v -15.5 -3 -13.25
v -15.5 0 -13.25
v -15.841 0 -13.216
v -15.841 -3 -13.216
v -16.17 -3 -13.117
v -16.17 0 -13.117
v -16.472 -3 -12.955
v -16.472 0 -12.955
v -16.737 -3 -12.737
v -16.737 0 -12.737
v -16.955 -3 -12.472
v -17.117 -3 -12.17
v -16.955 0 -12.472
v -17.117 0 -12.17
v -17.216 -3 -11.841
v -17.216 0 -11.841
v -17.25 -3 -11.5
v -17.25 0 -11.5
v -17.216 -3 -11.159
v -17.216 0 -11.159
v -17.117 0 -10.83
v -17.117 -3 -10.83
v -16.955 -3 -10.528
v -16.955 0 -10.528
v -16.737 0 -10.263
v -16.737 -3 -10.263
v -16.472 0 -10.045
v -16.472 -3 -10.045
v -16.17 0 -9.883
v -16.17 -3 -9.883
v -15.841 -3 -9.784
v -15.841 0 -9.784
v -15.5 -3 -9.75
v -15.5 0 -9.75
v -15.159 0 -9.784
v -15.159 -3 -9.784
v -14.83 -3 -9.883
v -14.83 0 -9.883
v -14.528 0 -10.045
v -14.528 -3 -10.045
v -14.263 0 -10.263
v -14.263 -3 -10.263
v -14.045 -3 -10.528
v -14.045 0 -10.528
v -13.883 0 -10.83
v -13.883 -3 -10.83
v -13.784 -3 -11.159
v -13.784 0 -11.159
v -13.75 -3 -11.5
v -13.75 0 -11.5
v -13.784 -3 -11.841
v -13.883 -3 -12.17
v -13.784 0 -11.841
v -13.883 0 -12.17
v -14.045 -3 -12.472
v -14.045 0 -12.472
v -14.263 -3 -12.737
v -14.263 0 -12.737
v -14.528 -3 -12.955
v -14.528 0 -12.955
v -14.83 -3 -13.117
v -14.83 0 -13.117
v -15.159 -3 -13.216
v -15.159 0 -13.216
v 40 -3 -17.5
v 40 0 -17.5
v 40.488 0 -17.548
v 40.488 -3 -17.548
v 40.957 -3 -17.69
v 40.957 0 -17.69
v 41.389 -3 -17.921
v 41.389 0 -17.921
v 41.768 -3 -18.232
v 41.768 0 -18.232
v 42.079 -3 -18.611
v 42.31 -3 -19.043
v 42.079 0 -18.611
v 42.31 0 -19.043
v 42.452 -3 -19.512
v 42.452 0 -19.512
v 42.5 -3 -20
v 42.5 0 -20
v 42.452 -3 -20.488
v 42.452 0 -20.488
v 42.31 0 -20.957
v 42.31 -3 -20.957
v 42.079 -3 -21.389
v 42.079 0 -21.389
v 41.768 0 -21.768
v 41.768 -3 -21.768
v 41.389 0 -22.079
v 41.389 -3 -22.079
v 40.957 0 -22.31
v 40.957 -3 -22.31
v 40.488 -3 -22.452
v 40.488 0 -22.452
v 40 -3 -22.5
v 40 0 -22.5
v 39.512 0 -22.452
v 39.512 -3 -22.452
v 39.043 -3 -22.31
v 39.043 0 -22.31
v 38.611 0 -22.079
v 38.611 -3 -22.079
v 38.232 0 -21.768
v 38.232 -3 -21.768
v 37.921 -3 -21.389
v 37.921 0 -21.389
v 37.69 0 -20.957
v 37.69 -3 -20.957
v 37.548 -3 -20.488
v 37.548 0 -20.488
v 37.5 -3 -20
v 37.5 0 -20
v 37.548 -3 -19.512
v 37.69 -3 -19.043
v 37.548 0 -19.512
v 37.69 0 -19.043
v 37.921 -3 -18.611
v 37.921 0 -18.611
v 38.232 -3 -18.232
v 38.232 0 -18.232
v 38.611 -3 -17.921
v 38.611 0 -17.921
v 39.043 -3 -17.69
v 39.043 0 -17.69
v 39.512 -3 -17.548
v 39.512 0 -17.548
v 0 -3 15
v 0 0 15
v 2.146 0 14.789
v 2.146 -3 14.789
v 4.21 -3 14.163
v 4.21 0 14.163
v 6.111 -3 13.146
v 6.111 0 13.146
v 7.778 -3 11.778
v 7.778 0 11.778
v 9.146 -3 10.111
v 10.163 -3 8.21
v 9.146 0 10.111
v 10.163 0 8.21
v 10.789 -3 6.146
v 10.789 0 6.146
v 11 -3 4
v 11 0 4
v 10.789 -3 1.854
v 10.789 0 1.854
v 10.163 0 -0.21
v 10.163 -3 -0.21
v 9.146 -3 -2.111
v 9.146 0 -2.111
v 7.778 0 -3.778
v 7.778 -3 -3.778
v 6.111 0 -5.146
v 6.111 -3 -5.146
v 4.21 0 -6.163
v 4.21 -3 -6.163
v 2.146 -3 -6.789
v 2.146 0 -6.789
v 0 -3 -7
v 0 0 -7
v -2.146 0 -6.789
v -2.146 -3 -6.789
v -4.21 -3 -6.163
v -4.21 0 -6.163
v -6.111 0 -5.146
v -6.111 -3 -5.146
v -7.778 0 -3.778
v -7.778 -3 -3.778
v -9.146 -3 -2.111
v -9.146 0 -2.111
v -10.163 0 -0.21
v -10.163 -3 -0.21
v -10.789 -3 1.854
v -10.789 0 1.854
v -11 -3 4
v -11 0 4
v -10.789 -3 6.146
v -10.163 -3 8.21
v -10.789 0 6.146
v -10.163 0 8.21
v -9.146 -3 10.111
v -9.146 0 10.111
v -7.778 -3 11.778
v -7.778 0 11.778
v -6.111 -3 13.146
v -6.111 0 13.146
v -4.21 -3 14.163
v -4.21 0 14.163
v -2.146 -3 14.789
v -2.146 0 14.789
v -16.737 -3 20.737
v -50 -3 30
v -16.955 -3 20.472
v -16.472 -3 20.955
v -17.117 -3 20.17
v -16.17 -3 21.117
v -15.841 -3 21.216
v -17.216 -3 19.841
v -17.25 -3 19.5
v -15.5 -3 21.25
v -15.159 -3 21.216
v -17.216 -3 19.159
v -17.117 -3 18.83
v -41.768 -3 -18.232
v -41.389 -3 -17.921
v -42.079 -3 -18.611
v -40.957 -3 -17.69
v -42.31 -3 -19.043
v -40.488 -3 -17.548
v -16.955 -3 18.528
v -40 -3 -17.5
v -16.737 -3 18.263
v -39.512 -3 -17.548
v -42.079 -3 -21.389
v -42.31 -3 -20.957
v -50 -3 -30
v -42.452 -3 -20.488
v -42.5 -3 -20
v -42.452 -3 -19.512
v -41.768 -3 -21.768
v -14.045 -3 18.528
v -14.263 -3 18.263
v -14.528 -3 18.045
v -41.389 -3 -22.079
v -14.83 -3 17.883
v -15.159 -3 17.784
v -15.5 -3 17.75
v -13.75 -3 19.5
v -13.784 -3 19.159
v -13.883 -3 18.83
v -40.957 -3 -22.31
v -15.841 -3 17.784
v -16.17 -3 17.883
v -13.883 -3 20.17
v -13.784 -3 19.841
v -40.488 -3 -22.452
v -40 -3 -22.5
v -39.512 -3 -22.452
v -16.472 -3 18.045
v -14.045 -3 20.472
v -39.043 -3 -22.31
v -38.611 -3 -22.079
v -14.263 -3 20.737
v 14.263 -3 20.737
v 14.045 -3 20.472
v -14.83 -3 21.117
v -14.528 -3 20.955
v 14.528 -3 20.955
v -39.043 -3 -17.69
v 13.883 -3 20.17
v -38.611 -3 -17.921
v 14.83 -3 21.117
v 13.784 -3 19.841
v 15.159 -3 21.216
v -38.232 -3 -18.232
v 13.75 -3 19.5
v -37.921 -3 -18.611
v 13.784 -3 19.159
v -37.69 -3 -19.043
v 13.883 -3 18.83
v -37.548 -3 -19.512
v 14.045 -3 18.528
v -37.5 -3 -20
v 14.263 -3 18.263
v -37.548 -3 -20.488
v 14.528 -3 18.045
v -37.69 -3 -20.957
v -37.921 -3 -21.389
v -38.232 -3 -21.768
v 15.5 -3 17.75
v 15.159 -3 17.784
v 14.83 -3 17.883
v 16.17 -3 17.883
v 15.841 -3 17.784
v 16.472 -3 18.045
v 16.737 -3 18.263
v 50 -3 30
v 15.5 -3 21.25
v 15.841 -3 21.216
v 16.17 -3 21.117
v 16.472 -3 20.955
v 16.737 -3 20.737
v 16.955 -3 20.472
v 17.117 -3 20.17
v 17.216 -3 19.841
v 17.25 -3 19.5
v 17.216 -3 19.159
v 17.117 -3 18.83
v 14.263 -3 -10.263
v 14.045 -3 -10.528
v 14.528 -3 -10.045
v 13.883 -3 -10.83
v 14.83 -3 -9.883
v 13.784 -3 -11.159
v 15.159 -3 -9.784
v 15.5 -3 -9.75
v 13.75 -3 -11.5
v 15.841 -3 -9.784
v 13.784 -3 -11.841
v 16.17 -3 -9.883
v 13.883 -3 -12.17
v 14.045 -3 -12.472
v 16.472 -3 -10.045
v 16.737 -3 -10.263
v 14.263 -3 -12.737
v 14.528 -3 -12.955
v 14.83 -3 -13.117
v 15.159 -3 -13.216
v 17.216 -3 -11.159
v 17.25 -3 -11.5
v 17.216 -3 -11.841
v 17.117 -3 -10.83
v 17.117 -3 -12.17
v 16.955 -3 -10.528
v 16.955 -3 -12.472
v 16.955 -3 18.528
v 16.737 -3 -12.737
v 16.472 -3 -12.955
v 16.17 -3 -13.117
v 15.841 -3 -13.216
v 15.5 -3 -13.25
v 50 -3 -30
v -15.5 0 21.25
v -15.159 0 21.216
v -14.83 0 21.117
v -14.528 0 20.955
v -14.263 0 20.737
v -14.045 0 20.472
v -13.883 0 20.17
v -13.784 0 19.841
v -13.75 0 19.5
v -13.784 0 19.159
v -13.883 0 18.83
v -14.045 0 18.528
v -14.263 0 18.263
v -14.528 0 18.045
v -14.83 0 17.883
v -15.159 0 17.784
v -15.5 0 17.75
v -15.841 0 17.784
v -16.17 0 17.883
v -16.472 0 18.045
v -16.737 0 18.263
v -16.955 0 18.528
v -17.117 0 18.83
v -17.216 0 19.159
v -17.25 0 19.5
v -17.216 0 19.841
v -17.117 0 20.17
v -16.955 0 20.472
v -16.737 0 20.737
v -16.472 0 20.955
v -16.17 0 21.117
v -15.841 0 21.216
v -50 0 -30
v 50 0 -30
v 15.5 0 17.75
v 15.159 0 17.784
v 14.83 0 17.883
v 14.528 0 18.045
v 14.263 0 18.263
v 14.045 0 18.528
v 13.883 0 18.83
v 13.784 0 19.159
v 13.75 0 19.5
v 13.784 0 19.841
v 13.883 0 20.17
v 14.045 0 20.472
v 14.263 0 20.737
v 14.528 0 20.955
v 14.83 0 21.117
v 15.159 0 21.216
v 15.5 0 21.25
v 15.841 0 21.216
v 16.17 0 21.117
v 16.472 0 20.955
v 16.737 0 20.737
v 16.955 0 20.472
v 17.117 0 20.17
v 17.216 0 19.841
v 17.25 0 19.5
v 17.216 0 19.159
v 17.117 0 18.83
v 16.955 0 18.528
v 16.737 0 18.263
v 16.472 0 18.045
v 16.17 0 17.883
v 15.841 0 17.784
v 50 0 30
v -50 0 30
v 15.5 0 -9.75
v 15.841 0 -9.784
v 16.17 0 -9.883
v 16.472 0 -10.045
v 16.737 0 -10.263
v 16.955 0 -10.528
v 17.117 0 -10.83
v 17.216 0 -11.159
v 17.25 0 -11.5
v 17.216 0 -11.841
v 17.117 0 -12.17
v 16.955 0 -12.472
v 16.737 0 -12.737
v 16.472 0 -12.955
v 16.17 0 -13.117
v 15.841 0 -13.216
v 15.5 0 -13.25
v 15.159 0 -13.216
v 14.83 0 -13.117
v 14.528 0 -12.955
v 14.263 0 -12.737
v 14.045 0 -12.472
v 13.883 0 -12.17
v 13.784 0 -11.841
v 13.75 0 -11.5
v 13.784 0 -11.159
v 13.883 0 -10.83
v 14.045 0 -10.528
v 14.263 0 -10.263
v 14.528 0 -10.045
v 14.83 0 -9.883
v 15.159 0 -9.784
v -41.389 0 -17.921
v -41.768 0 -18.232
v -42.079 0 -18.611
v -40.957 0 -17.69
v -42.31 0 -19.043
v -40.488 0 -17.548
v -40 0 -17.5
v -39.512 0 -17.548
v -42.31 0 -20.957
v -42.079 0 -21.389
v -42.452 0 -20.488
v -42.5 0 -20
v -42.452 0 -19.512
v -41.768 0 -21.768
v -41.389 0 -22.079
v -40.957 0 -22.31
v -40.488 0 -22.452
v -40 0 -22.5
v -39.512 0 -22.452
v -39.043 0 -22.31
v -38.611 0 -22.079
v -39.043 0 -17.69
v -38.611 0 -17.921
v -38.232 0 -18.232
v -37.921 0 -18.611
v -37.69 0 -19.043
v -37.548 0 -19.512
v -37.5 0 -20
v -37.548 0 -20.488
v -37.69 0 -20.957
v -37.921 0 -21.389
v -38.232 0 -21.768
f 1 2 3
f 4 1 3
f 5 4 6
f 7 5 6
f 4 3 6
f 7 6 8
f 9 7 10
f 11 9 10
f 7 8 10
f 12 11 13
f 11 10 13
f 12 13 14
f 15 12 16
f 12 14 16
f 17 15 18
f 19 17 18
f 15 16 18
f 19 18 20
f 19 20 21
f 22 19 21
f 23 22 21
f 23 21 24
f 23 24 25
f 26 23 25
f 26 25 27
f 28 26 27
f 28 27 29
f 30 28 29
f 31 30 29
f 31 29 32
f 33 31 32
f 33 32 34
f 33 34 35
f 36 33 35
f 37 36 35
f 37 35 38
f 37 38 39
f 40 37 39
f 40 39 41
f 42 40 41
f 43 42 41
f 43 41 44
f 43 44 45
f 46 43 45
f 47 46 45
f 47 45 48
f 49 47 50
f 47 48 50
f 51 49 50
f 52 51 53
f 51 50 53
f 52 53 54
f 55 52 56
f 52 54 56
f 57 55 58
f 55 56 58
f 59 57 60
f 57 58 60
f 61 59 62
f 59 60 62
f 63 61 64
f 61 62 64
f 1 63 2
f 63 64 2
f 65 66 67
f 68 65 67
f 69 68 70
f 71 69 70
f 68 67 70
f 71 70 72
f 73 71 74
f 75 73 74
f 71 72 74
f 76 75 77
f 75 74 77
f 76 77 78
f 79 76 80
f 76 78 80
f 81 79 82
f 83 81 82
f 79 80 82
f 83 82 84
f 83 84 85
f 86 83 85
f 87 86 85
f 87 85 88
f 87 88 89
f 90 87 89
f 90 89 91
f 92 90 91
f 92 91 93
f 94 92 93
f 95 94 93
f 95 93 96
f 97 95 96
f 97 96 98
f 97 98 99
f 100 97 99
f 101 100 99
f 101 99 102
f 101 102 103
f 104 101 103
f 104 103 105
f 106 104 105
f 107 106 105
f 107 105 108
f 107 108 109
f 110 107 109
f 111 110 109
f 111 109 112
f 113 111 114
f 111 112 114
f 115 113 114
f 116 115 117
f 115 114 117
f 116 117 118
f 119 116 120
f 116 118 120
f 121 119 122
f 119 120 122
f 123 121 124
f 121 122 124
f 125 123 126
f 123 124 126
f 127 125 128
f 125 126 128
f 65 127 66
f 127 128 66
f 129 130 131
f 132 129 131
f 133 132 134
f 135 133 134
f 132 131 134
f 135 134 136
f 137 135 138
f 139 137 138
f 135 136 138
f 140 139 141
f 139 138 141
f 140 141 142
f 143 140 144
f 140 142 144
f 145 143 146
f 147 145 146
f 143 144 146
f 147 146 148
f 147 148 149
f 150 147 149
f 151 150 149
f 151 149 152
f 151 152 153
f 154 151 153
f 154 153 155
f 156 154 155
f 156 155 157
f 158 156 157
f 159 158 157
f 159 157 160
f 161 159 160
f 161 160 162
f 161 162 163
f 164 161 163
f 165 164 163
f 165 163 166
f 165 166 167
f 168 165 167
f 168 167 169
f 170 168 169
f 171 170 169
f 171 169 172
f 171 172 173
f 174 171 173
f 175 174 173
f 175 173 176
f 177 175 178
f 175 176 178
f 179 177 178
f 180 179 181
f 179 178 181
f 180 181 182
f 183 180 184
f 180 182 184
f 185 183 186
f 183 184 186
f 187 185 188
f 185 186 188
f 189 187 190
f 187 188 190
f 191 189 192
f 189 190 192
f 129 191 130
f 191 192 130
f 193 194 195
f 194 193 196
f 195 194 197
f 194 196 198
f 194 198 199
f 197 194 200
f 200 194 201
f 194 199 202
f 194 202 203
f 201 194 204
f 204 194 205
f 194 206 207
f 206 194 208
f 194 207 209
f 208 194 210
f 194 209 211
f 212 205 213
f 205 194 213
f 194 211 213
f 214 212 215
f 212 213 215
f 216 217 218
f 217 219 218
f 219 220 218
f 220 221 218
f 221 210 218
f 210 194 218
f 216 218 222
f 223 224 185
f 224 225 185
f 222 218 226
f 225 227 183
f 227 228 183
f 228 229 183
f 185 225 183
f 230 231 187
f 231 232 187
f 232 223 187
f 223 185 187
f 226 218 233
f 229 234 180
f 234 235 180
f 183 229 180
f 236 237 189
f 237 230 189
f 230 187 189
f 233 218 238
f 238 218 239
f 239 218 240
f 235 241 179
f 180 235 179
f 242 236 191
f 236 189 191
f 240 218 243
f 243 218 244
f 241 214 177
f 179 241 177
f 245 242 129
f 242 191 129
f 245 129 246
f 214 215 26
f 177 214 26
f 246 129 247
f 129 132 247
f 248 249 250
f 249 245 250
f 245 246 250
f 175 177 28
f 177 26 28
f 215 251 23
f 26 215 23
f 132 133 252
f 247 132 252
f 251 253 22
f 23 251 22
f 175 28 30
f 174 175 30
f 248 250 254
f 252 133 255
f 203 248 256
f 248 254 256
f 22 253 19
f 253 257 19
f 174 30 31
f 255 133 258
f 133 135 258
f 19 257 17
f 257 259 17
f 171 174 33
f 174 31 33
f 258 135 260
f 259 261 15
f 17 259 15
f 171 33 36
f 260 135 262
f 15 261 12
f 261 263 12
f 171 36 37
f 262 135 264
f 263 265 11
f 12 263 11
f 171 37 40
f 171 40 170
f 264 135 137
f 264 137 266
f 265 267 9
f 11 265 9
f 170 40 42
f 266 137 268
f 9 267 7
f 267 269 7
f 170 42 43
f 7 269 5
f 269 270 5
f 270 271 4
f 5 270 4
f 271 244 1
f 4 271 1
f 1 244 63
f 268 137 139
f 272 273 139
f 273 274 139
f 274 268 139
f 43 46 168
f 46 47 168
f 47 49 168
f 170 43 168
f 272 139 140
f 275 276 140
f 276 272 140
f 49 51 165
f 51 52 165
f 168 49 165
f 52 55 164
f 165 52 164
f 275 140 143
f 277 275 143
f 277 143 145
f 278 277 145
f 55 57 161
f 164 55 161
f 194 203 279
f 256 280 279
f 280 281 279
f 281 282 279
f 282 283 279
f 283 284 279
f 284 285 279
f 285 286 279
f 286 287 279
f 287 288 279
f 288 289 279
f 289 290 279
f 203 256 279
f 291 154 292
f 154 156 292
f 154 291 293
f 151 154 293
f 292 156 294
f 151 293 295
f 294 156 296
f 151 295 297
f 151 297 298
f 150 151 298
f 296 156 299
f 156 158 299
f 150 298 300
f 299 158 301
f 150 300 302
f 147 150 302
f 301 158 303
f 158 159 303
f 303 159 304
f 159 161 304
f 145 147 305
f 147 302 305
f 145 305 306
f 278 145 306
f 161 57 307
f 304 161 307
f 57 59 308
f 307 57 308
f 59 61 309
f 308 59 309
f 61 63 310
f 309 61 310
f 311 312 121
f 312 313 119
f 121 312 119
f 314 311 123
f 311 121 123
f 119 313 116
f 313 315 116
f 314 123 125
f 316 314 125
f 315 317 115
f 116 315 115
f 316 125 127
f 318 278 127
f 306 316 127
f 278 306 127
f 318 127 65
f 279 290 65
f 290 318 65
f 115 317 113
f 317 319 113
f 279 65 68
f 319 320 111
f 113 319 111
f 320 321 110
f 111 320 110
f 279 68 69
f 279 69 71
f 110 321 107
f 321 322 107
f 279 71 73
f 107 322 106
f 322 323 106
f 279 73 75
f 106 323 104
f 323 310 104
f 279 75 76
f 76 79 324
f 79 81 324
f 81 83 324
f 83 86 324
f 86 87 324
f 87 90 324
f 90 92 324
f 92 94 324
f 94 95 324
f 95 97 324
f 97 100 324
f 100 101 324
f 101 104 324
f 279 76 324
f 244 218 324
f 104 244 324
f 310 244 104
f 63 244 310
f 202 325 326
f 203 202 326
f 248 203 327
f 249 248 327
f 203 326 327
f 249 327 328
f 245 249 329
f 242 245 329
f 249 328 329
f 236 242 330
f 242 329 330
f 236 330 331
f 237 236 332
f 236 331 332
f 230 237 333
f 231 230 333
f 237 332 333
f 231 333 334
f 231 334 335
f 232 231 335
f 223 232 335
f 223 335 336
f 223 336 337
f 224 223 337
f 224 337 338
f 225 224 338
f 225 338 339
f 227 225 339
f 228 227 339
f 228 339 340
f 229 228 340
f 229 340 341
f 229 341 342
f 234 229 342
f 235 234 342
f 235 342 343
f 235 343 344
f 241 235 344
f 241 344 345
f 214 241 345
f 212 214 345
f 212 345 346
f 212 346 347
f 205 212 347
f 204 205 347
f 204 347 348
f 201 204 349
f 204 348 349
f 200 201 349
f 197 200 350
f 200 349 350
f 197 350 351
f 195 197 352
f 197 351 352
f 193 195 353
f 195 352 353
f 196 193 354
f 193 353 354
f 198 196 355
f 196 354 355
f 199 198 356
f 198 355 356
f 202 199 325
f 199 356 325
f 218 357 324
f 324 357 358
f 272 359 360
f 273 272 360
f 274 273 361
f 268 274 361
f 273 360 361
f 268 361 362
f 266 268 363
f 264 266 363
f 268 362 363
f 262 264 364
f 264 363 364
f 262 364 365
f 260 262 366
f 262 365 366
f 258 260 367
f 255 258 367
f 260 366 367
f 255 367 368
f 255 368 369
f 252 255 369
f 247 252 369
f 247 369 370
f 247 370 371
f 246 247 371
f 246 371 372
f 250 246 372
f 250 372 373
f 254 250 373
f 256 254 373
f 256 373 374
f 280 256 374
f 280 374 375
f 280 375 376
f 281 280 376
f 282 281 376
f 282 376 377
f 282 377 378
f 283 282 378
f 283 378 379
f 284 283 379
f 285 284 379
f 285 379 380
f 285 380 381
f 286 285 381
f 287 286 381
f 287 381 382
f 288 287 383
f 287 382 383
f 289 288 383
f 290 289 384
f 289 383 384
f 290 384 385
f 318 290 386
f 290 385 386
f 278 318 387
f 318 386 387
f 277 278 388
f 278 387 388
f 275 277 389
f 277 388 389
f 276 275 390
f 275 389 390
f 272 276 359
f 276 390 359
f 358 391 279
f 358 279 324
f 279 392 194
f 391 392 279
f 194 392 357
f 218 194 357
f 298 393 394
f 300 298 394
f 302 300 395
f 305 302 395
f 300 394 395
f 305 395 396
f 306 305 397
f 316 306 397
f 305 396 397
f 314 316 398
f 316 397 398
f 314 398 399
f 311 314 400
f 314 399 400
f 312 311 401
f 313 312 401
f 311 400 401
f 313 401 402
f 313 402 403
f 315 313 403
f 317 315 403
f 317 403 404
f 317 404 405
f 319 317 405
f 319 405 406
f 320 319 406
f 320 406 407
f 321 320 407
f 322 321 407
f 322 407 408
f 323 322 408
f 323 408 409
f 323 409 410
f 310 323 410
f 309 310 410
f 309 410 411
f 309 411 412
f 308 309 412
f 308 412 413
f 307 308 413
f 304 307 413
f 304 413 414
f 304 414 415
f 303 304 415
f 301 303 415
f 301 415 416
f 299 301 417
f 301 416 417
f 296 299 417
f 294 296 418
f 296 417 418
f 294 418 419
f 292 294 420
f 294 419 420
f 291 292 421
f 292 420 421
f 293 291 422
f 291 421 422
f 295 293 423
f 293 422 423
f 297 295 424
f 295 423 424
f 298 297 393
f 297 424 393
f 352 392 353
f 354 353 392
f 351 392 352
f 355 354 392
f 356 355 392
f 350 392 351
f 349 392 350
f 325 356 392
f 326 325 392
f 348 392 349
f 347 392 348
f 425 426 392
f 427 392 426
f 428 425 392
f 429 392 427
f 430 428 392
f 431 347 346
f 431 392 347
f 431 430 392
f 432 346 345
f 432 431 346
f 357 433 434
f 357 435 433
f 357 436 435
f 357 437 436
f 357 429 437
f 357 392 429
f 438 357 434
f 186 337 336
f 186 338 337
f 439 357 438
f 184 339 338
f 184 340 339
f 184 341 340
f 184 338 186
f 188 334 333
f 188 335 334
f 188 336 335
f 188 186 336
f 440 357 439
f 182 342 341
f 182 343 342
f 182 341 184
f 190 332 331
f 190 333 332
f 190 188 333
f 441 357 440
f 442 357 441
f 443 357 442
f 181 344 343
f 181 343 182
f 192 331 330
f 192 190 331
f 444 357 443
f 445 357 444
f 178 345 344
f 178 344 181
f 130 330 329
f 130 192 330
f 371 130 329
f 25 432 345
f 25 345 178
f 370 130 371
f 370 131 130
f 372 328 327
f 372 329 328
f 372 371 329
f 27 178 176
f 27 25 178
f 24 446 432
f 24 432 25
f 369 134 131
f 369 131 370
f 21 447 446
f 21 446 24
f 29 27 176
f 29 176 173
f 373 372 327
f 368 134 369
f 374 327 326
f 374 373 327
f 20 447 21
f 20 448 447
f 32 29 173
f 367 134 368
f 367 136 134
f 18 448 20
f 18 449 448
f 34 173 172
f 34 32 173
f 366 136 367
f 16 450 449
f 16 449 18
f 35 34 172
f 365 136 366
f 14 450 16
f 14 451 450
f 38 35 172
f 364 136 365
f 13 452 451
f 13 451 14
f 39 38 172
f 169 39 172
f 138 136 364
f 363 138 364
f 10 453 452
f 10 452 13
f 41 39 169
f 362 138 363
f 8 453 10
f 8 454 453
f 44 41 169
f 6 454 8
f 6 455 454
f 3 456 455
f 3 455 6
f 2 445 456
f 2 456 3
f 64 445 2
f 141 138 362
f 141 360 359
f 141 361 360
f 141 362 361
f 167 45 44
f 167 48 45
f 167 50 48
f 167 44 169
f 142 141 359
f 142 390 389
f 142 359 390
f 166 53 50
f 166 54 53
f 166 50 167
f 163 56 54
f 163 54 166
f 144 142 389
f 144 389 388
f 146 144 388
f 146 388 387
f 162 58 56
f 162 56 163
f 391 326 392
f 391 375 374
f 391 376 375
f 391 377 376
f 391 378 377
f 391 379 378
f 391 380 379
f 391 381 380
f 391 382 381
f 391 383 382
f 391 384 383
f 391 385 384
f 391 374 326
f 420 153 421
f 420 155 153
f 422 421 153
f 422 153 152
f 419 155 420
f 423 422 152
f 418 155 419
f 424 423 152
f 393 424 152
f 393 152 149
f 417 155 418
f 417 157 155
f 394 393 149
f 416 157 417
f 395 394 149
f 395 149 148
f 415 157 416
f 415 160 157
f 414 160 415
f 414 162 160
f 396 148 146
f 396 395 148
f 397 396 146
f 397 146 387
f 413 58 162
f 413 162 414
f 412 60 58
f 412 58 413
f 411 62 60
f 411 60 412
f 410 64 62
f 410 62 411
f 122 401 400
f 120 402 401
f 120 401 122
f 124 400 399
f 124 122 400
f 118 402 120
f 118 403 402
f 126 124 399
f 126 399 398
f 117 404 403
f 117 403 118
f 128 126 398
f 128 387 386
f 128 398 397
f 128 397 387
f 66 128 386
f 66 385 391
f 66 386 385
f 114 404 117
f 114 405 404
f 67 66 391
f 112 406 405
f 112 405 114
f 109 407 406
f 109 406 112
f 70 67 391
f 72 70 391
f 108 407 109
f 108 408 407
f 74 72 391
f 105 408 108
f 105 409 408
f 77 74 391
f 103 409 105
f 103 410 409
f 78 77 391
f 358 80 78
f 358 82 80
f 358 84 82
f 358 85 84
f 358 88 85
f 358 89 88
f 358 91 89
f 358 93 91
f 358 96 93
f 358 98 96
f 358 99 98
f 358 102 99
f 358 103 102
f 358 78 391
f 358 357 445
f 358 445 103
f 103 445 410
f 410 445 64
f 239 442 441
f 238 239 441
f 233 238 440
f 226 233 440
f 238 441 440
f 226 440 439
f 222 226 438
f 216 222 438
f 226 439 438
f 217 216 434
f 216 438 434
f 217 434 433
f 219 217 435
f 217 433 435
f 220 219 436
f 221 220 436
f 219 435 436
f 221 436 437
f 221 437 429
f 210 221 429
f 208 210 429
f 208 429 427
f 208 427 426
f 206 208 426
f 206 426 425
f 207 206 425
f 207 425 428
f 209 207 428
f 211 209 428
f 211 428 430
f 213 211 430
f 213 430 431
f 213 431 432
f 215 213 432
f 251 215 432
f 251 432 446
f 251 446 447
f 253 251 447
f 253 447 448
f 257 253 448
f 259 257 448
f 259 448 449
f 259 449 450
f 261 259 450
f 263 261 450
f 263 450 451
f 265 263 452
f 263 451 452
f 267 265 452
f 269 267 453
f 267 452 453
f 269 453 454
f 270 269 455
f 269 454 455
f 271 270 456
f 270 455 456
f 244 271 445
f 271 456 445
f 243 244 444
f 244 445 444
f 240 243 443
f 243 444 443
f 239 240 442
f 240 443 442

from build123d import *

# Parameters (mm, degrees)
SKETCH1_W          = 100
SKETCH1_H          = 60
BASE_FLANGE1_DEPTH = 3
SKETCH6_R          = 2.5
SKETCH6_R_2        = 11
SKETCH6_R_3        = 1.75
CUT_EXTRUDE1_DEPTH = 10


# Sheet-metal steps are written as plain solids
with BuildPart() as part:
    # Sketch1 → Base-Flange1 (new body)
    with BuildSketch(Plane(origin=(0, 0, 0), x_dir=(1, 0, 0), z_dir=(0, 1, 0))):
        Rectangle(SKETCH1_W, SKETCH1_H)
    extrude(amount=-BASE_FLANGE1_DEPTH)

    # Sketch6 → Cut-Extrude1 (cut)
    with BuildSketch(Plane(origin=(0, 0, 0), x_dir=(1, 0, 0), z_dir=(0, 1, 0))):
        with Locations(Location((40, 20, 0), (0, 0, 270))):
            Circle(SKETCH6_R)
        with Locations(Location((-40, 20, 0), (0, 0, 90))):
            Circle(SKETCH6_R)
        with Locations(Location((0, -4, 0), (0, 0, 270))):
            Circle(SKETCH6_R_2)
        with Locations(Location((15.5, 11.5, 0), (0, 0, 270))):
            Circle(SKETCH6_R_3)
        with Locations(Location((15.5, -19.5, 0), (0, 0, 90))):
            Circle(SKETCH6_R_3)
        with Locations(Location((-15.5, -19.5, 0), (0, 0, 270))):
            Circle(SKETCH6_R_3)
        with Locations(Location((-15.5, 11.5, 0), (0, 0, 90))):
            Circle(SKETCH6_R_3)
    extrude(amount=-CUT_EXTRUDE1_DEPTH, mode=Mode.SUBTRACT)


solid = part.part
